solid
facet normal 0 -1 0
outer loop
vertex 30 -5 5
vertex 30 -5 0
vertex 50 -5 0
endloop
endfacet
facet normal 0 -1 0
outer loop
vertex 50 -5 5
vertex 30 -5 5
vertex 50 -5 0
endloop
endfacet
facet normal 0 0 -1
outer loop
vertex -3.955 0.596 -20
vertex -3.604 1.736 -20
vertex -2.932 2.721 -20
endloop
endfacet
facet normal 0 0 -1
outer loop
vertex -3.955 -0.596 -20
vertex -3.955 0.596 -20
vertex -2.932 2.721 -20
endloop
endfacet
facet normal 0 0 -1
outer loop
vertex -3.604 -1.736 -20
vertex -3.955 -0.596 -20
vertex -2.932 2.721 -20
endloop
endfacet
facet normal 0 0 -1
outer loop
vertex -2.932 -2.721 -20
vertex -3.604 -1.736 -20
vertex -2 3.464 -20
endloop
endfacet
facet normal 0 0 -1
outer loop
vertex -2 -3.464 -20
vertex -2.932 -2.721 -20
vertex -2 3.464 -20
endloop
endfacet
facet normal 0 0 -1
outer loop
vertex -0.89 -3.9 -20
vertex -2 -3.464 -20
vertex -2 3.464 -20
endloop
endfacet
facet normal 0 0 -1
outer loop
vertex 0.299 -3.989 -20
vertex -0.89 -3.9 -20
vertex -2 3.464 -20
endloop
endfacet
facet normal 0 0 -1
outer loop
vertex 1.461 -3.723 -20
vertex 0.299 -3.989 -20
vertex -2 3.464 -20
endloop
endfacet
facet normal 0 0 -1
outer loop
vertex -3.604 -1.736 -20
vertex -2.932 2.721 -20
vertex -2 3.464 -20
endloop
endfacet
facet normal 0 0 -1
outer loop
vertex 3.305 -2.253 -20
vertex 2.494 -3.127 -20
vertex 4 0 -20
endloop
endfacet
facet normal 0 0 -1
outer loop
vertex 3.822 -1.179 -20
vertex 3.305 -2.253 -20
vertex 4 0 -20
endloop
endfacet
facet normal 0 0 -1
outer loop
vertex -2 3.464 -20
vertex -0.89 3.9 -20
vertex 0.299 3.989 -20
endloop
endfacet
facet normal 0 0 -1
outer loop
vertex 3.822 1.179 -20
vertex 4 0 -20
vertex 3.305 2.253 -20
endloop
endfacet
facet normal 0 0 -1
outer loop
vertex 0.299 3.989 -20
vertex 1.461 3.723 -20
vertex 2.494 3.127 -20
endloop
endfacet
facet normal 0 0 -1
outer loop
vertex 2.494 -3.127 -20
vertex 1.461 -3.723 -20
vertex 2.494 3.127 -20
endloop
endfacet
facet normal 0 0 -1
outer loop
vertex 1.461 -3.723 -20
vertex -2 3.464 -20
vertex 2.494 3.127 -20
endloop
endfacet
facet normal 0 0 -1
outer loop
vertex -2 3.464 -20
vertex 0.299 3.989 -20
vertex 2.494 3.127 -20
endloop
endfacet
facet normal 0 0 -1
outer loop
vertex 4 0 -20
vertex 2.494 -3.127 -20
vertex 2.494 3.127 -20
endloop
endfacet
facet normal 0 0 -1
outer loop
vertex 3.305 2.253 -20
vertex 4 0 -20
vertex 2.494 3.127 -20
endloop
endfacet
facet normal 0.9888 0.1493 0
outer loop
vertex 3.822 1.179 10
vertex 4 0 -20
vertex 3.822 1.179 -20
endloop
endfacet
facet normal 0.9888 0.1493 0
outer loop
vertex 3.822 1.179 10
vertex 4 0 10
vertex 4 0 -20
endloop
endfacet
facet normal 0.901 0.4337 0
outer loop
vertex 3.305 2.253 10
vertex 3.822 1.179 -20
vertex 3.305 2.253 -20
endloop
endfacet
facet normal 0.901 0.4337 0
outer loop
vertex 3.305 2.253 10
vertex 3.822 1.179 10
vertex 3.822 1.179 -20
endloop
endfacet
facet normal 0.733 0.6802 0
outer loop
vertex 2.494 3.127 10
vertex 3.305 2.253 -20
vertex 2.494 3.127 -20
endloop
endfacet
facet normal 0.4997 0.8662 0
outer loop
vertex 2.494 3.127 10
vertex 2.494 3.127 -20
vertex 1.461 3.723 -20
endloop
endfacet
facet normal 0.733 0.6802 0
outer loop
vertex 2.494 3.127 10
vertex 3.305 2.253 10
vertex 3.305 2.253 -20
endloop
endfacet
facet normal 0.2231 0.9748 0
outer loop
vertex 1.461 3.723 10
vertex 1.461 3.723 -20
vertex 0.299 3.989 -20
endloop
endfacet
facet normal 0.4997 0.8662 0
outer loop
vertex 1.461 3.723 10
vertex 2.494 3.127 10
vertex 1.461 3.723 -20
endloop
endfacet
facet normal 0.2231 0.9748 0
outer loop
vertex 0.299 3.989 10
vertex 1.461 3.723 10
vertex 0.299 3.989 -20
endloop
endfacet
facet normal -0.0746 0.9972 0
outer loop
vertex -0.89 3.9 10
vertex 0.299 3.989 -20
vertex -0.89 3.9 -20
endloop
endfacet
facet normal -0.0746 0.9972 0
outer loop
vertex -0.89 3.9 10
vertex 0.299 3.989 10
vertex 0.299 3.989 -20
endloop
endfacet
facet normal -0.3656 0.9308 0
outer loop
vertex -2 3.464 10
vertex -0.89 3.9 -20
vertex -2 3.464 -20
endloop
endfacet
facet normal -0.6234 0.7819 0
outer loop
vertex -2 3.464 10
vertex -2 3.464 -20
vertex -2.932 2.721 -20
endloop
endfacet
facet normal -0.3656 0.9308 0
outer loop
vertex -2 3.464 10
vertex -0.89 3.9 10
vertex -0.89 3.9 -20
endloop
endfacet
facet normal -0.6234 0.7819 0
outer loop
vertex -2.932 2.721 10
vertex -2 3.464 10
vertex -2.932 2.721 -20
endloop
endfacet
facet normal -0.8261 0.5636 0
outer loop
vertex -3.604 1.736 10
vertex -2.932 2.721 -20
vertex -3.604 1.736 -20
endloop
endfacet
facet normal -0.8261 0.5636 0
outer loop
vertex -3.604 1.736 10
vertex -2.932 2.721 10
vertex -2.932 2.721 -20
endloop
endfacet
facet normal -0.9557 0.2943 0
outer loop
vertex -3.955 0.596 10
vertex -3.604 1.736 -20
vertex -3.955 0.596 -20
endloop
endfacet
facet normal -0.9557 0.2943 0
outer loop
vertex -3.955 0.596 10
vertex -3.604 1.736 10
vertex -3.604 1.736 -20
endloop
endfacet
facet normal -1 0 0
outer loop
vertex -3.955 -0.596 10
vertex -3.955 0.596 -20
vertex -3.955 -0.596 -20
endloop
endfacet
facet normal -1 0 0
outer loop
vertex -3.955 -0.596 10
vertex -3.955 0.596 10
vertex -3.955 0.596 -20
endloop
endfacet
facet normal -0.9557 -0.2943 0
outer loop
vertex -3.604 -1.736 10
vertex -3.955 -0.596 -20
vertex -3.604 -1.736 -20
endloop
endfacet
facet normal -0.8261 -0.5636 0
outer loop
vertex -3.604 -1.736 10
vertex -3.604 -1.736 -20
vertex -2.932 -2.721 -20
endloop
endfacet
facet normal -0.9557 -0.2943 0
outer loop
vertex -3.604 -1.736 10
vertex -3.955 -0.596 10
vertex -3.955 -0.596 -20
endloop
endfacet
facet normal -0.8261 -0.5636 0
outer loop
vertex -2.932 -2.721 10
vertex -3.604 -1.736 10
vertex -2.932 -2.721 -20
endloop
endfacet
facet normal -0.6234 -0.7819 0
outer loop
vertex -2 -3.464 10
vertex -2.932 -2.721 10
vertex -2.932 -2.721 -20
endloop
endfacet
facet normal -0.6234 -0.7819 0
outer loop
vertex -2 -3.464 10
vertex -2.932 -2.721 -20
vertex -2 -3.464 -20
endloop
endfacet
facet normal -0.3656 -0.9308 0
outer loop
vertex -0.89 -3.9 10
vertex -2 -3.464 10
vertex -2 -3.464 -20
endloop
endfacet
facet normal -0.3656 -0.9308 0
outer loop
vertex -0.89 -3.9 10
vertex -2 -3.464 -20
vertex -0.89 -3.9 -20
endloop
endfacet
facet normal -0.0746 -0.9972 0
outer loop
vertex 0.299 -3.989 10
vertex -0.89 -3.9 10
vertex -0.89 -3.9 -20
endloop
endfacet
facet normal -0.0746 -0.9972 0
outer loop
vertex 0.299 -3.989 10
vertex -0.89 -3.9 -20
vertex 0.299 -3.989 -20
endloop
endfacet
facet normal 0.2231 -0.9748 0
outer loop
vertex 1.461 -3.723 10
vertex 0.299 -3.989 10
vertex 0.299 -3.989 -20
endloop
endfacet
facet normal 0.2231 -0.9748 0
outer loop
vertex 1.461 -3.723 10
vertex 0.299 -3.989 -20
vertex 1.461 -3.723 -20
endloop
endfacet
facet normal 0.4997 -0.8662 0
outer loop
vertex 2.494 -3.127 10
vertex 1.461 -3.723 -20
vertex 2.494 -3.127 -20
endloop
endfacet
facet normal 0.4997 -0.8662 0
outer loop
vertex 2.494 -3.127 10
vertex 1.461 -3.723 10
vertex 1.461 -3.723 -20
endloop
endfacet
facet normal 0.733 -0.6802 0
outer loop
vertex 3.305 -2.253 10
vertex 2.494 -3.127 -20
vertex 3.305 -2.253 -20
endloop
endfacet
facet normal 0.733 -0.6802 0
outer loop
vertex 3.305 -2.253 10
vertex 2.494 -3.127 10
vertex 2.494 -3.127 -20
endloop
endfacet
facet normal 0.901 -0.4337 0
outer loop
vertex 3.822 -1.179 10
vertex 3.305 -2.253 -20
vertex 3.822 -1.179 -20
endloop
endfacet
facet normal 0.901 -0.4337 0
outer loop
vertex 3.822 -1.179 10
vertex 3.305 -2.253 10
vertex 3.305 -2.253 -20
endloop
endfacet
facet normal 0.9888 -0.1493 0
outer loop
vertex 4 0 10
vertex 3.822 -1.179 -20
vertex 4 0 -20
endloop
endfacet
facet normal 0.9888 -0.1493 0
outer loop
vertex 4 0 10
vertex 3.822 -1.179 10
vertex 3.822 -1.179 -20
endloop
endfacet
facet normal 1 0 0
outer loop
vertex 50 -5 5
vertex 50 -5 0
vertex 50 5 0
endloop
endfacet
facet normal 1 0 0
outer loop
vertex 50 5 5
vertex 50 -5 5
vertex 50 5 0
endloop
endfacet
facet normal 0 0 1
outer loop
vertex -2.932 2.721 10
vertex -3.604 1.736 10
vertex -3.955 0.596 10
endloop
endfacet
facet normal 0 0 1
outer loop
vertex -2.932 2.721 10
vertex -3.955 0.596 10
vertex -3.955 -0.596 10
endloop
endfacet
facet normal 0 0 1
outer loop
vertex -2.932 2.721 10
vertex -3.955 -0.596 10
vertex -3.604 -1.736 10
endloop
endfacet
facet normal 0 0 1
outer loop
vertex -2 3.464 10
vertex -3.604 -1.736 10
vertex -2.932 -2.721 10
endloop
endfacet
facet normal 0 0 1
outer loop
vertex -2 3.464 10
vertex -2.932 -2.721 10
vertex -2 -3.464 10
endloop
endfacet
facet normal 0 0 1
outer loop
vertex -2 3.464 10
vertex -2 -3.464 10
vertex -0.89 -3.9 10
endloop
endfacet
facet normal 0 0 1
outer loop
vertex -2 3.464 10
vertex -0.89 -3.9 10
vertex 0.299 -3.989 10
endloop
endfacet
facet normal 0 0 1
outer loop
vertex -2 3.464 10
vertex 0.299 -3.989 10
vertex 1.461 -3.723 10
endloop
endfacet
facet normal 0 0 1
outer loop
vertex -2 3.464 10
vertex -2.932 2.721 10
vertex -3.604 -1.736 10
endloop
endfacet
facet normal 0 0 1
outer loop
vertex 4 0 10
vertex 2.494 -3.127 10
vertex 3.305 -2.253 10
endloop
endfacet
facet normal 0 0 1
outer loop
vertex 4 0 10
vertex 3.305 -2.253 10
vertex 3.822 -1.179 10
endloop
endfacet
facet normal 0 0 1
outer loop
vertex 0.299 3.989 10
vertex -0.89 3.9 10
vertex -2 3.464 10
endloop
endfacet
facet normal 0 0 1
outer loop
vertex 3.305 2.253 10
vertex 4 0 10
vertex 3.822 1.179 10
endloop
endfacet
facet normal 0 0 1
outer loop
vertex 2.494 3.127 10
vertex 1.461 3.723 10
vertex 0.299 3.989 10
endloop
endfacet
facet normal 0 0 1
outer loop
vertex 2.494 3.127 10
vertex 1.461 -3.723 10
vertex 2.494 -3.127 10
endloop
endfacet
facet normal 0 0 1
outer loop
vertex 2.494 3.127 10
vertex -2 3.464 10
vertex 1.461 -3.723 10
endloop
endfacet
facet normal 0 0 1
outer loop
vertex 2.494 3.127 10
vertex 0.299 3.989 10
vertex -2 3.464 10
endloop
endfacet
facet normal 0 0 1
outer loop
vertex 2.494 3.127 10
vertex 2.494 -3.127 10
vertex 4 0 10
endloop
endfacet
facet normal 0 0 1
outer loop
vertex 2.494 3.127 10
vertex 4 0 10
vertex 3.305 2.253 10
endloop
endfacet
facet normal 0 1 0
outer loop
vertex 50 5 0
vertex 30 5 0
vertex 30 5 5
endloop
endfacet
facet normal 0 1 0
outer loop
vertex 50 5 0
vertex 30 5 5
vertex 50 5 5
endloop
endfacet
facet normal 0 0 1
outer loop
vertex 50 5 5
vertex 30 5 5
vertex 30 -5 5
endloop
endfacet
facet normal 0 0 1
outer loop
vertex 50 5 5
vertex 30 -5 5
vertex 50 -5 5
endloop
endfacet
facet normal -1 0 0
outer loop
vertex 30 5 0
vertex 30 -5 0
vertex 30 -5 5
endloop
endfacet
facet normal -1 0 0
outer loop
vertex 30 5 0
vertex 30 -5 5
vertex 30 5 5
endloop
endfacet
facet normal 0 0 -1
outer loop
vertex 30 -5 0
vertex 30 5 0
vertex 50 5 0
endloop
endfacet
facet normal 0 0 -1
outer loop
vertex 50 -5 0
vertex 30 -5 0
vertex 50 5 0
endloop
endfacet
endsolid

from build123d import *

# Parameters (mm, degrees)
F0_W          = 20
F0_H          = 10
F1_DEPTH      = 5
F0_R          = 4
F3_DEPTH      = 10
F3_DEPTH_BACK = 20


# Not quite as in the source:
# - a feature names something its author has since deleted; it is built from what else it names


with BuildPart() as f1:
    # F0 (on Top) → F1 (new body)
    with BuildSketch(Plane.XY):
        with Locations((40, 0)):
            Rectangle(F0_W, F0_H)
    extrude(amount=F1_DEPTH)


with BuildPart() as f3:
    # F0 (on Top) → F3 (new body, two sides)
    with BuildSketch(Plane.XY) as f3_sk:
        Circle(F0_R)
    extrude(amount=F3_DEPTH)
    extrude(f3_sk.sketch, amount=-F3_DEPTH_BACK)


solid = Compound([f1.part, f3.part])
